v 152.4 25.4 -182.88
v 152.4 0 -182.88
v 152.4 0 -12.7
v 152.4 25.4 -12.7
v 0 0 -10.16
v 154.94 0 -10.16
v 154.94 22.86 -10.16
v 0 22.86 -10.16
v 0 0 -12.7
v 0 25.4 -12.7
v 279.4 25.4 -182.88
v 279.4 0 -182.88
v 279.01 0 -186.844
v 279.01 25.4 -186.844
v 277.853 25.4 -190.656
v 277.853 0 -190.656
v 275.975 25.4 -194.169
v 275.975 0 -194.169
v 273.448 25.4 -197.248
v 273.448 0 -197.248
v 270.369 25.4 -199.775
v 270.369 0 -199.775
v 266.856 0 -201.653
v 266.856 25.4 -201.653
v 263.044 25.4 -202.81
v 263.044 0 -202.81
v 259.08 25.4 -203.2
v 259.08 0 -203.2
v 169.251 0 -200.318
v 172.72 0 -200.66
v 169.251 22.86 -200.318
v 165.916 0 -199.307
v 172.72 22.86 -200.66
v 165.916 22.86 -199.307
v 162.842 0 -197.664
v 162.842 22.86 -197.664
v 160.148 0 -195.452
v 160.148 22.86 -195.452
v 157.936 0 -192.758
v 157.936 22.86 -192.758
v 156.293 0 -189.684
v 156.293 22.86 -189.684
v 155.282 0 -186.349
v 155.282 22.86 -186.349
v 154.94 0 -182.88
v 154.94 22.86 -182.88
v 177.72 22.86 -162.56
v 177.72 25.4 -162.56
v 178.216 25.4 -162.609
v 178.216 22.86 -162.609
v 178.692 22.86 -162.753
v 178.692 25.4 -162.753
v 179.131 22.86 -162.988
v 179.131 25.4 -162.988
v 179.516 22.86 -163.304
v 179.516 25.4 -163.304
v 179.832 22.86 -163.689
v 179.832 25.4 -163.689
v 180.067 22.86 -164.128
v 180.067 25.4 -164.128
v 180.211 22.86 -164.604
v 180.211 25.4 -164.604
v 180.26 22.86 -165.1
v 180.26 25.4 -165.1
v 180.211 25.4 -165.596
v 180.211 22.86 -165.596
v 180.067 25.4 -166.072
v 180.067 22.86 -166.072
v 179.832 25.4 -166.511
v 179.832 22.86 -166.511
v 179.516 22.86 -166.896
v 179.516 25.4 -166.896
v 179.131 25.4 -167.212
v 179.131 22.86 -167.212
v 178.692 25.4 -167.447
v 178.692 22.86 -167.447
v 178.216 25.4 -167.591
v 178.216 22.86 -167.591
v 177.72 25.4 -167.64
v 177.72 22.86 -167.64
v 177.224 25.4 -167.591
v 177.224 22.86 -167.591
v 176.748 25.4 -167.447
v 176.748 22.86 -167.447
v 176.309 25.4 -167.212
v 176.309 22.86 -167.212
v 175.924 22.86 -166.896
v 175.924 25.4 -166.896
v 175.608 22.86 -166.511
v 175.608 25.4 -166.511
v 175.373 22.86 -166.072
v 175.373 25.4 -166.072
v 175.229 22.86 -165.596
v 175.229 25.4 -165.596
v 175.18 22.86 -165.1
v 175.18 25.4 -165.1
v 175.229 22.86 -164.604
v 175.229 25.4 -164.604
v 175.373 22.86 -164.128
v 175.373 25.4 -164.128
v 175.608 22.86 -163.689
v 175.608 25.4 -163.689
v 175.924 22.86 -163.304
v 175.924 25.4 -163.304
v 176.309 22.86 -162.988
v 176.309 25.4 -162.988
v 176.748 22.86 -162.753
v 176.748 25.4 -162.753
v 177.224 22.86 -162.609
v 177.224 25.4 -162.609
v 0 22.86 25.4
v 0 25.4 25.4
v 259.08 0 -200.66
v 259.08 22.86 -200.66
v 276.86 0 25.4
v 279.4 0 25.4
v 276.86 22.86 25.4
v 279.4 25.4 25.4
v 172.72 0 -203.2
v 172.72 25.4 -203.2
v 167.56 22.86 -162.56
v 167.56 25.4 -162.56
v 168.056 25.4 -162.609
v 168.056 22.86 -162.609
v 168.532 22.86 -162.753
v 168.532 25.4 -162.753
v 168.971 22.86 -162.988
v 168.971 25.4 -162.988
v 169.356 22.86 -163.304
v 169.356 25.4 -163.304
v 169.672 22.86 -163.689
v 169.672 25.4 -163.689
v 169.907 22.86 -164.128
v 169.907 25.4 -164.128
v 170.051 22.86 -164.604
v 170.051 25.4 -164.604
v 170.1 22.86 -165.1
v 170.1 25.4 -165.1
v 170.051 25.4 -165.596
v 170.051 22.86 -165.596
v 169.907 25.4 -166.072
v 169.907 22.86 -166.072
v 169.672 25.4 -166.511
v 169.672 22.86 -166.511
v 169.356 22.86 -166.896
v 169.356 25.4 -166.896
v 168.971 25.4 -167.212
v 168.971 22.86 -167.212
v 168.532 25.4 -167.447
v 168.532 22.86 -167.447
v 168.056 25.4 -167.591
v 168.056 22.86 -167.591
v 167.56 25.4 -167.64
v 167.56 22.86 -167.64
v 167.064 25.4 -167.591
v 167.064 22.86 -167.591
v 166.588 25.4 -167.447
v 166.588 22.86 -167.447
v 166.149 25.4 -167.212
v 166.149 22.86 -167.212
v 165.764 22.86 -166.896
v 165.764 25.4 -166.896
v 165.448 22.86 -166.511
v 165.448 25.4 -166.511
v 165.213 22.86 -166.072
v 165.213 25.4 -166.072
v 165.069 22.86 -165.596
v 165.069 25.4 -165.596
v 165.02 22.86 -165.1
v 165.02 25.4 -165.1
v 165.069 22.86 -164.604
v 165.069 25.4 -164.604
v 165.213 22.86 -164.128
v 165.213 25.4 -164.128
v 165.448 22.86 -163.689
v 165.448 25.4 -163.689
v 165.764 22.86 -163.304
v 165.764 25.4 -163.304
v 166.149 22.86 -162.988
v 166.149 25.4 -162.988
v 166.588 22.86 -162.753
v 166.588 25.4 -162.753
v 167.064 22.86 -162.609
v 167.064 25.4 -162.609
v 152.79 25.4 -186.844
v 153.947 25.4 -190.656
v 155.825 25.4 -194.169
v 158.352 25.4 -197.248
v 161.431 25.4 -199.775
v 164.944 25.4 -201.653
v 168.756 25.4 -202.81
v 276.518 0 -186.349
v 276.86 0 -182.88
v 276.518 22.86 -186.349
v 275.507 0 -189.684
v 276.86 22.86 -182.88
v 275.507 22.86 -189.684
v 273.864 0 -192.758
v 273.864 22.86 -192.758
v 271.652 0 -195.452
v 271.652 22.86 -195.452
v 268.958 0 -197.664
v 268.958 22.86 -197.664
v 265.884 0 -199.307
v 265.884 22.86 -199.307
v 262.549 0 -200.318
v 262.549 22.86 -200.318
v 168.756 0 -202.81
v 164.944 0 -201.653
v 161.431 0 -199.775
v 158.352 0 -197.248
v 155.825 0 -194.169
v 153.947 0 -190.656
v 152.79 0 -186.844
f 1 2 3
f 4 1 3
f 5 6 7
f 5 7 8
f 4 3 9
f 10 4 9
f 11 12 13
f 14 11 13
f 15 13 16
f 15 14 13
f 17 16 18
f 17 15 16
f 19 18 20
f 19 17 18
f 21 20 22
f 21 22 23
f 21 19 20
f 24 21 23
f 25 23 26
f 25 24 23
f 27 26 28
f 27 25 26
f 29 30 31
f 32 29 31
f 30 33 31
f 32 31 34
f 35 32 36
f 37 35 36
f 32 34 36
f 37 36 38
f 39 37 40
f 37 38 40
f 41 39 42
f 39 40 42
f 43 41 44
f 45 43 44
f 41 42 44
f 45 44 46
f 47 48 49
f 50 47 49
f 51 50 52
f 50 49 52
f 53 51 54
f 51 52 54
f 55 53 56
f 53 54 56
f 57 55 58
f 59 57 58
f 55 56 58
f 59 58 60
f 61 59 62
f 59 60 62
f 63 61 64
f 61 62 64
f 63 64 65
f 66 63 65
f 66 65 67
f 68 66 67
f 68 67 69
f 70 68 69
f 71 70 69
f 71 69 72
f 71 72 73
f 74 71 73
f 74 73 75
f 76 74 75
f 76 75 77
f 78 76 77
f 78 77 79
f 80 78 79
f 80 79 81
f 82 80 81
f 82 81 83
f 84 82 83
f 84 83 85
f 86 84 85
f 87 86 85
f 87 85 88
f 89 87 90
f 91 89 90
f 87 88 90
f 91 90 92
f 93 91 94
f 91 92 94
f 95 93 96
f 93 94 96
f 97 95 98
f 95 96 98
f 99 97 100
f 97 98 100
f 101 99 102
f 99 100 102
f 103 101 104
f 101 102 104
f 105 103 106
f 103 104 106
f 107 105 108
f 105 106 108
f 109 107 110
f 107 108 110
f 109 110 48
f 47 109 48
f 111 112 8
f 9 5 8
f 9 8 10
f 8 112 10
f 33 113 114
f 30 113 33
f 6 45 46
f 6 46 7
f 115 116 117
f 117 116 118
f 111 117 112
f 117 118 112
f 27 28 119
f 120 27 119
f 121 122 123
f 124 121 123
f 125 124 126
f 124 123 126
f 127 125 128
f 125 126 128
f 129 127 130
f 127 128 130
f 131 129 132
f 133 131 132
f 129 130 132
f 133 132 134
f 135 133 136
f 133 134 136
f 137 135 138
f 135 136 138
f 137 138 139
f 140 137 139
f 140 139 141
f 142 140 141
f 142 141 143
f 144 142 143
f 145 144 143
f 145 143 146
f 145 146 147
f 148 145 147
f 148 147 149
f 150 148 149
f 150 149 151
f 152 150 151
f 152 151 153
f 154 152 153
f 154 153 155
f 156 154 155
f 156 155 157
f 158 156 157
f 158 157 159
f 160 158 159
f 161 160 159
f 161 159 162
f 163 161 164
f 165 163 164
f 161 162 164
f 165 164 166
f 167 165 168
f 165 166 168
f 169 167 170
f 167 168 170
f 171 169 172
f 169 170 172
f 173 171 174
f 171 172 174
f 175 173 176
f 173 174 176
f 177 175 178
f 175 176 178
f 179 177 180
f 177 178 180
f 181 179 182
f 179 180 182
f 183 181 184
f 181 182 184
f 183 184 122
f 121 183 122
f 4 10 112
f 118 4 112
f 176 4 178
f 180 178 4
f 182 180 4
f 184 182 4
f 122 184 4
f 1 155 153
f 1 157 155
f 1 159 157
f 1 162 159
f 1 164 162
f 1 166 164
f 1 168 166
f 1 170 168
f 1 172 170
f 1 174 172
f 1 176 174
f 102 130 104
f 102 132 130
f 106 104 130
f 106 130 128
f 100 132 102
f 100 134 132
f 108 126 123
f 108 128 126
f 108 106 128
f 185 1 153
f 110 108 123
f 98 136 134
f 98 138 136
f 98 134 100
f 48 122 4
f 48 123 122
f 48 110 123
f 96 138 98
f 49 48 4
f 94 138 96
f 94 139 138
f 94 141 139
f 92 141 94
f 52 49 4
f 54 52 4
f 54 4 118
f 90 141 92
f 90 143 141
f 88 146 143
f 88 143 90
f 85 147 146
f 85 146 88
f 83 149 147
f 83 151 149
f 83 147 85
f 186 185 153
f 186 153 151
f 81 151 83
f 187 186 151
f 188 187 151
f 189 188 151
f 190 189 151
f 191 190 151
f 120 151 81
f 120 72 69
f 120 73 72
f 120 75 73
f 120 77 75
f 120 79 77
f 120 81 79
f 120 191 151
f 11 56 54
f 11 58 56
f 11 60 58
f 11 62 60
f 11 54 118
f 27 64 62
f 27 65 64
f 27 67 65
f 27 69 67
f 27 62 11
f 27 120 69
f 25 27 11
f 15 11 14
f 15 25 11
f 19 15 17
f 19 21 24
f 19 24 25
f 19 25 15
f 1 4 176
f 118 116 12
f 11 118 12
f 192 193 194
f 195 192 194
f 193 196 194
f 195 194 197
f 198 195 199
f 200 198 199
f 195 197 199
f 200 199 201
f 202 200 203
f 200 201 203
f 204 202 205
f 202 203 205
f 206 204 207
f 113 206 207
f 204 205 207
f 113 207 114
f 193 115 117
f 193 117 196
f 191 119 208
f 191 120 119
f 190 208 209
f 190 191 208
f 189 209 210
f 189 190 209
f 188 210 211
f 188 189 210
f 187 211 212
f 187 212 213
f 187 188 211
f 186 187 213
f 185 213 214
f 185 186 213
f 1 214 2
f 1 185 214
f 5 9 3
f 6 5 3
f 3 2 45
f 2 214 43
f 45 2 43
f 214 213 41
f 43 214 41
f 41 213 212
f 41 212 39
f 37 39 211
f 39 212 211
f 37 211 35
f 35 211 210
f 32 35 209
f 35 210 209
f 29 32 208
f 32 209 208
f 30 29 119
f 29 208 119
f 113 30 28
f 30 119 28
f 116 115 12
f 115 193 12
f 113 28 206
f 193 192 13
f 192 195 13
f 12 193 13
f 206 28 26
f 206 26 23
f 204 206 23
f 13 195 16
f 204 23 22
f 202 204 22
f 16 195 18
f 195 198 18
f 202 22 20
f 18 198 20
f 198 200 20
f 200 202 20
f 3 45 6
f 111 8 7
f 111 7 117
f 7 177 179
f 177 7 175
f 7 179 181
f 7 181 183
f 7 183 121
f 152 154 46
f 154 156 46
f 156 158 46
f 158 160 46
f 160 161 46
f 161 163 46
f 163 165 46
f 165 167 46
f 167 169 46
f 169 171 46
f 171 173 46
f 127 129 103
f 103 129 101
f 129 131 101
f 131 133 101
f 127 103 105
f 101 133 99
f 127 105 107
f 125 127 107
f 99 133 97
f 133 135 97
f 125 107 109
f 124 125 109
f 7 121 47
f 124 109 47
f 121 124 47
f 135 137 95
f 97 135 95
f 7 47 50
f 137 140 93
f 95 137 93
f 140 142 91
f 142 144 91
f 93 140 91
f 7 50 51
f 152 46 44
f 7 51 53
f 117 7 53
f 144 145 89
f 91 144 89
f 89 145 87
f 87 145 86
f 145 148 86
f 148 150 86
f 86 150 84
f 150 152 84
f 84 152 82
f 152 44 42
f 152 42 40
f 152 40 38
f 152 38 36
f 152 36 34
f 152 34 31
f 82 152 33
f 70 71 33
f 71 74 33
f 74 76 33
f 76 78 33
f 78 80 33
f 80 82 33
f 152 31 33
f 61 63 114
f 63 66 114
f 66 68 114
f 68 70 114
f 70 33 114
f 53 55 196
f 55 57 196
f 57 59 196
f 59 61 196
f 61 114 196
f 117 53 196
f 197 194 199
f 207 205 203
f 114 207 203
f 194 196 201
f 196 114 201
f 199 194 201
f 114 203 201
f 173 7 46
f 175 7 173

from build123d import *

# Parameters (mm, degrees)
BOSS_EXTRUDE1_DEPTH = 25.4
FILLET1_R           = 20.32
SHELL1_T            = -2.54
SKETCH2_R           = 2.54
CUT_EXTRUDE1_DEPTH  = 347.409815103
CUT_EXTRUDE2_DEPTH  = 347.409815103


with BuildPart() as part:
    # Sketch1 → Boss-Extrude1 (new body)
    with BuildSketch(Plane(origin=(0, 0, 0), x_dir=(1, 0, 0), z_dir=(0, 1, 0))):
        Polygon((-279.4, 203.2), (-279.4, -203.2), (279.4, -203.2), (279.4, 203.2), (152.4, 203.2), (152.4, 12.7), (-152.4, 12.7), (-152.4, 203.2), align=None)
    extrude(amount=BOSS_EXTRUDE1_DEPTH)

    # Fillet1
    fillet1_edges = [part.edges().sort_by_distance(p)[0] for p in [
        (279.4, 12.7, -203.2),
        (-279.4, 12.7, -203.2),
        (-152.4, 12.7, -203.2),
        (152.4, 12.7, -203.2),
    ]]
    fillet(fillet1_edges, radius=FILLET1_R)

    # Shell1
    shell1_openings = [part.faces().sort_by_distance(p)[0] for p in [
        (0, 0, 37.577423361),
    ]]
    offset(amount=SHELL1_T, openings=shell1_openings, kind=Kind.INTERSECTION)

    # Sketch2 → Cut-Extrude1 (cut, through all)
    with BuildSketch(Plane(origin=(0, 25.4, 0), x_dir=(1, 0, 0), z_dir=(0, 1, 0))):
        with Locations(Location((-177.72, 165.1, 0), (0, 0, 270))):
            Circle(SKETCH2_R)
        with Locations(Location((-167.56, 165.1, 0), (0, 0, 270))):
            Circle(SKETCH2_R)
        with Locations(Location((167.56, 165.1, 0), (0, 0, 270))):
            Circle(SKETCH2_R)
        with Locations(Location((177.72, 165.1, 0), (0, 0, 270))):
            Circle(SKETCH2_R)
    extrude(amount=-CUT_EXTRUDE1_DEPTH, mode=Mode.SUBTRACT)

    # Sketch3 → Cut-Extrude2 (cut, through all)
    with BuildSketch(Plane(origin=(0, 25.4, 0), x_dir=(1, 0, 0), z_dir=(0, 1, 0))):
        Polygon((279.4, -253.088506779), (279.4, -25.4), (0, -25.4), (0, 203.2), (-296.633483773, 203.2), (-305.626462942, -253.088506779), align=None)
    extrude(amount=-CUT_EXTRUDE2_DEPTH, mode=Mode.SUBTRACT)


solid = part.part
